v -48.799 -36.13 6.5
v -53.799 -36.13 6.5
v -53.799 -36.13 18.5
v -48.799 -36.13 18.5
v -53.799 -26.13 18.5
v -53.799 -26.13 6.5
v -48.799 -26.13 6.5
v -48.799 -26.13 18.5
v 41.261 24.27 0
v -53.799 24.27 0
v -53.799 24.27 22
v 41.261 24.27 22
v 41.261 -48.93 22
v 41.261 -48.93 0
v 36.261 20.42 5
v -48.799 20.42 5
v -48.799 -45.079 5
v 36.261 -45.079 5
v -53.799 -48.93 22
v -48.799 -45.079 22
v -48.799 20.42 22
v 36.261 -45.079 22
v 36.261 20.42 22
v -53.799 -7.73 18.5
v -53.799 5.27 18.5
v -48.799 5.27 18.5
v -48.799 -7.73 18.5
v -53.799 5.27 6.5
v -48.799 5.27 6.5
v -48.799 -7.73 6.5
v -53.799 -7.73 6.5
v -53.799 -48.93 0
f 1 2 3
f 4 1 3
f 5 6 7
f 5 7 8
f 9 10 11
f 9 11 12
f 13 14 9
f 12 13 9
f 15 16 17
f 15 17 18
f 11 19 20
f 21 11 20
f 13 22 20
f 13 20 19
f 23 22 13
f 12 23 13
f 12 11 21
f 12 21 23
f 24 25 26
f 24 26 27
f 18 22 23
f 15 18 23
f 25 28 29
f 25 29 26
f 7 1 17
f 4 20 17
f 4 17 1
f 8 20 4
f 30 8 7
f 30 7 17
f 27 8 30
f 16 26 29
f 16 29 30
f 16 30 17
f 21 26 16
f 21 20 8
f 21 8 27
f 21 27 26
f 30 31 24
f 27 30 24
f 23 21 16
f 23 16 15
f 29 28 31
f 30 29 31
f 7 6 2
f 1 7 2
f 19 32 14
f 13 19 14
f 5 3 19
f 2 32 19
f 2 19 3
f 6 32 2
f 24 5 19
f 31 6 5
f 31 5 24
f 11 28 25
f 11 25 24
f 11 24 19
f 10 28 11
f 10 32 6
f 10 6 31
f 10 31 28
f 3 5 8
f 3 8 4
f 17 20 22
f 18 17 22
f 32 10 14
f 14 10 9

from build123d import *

# Parameters (mm, degrees)
F1_W     = 95.06
F1_H     = 73.2
F2_DEPTH = 22
F3_W     = 85.06
F3_H     = 65.4996002525
F4_DEPTH = 17
F5_W     = 13
F5_H     = 12
F6_DEPTH = 5
F5_W_2   = 10
F7_DEPTH = 5


with BuildPart() as f2:
    # F1 (on Top) → F2 (new body)
    with BuildSketch(Plane.XY):
        with Locations((-6.269495101, -12.3295125008)):
            Rectangle(F1_W, F1_H)
    extrude(amount=F2_DEPTH)

    # F3 (on face) → F4 (cut)
    with BuildSketch(Plane.XY.offset(22)):
        with Locations((-6.269495101, -12.3295125008)):
            Rectangle(F3_W, F3_H)
    extrude(amount=-F4_DEPTH, mode=Mode.SUBTRACT)

    # F5 (on face) → F6 (cut)
    with BuildSketch(Plane(origin=(-53.799495101, 0, 0), x_dir=(0, -1, 0), z_dir=(-1, 0, 0))):
        with Locations((1.2295125008, 12.5)):
            Rectangle(F5_W, F5_H)
    extrude(amount=-F6_DEPTH, mode=Mode.SUBTRACT)

    # F5 (on face) → F7 (cut)
    with BuildSketch(Plane(origin=(-53.799495101, 0, 0), x_dir=(0, -1, 0), z_dir=(-1, 0, 0))):
        with Locations((31.1295125008, 12.5)):
            Rectangle(F5_W_2, F5_H)
    extrude(amount=-F7_DEPTH, mode=Mode.SUBTRACT)


solid = f2.part
